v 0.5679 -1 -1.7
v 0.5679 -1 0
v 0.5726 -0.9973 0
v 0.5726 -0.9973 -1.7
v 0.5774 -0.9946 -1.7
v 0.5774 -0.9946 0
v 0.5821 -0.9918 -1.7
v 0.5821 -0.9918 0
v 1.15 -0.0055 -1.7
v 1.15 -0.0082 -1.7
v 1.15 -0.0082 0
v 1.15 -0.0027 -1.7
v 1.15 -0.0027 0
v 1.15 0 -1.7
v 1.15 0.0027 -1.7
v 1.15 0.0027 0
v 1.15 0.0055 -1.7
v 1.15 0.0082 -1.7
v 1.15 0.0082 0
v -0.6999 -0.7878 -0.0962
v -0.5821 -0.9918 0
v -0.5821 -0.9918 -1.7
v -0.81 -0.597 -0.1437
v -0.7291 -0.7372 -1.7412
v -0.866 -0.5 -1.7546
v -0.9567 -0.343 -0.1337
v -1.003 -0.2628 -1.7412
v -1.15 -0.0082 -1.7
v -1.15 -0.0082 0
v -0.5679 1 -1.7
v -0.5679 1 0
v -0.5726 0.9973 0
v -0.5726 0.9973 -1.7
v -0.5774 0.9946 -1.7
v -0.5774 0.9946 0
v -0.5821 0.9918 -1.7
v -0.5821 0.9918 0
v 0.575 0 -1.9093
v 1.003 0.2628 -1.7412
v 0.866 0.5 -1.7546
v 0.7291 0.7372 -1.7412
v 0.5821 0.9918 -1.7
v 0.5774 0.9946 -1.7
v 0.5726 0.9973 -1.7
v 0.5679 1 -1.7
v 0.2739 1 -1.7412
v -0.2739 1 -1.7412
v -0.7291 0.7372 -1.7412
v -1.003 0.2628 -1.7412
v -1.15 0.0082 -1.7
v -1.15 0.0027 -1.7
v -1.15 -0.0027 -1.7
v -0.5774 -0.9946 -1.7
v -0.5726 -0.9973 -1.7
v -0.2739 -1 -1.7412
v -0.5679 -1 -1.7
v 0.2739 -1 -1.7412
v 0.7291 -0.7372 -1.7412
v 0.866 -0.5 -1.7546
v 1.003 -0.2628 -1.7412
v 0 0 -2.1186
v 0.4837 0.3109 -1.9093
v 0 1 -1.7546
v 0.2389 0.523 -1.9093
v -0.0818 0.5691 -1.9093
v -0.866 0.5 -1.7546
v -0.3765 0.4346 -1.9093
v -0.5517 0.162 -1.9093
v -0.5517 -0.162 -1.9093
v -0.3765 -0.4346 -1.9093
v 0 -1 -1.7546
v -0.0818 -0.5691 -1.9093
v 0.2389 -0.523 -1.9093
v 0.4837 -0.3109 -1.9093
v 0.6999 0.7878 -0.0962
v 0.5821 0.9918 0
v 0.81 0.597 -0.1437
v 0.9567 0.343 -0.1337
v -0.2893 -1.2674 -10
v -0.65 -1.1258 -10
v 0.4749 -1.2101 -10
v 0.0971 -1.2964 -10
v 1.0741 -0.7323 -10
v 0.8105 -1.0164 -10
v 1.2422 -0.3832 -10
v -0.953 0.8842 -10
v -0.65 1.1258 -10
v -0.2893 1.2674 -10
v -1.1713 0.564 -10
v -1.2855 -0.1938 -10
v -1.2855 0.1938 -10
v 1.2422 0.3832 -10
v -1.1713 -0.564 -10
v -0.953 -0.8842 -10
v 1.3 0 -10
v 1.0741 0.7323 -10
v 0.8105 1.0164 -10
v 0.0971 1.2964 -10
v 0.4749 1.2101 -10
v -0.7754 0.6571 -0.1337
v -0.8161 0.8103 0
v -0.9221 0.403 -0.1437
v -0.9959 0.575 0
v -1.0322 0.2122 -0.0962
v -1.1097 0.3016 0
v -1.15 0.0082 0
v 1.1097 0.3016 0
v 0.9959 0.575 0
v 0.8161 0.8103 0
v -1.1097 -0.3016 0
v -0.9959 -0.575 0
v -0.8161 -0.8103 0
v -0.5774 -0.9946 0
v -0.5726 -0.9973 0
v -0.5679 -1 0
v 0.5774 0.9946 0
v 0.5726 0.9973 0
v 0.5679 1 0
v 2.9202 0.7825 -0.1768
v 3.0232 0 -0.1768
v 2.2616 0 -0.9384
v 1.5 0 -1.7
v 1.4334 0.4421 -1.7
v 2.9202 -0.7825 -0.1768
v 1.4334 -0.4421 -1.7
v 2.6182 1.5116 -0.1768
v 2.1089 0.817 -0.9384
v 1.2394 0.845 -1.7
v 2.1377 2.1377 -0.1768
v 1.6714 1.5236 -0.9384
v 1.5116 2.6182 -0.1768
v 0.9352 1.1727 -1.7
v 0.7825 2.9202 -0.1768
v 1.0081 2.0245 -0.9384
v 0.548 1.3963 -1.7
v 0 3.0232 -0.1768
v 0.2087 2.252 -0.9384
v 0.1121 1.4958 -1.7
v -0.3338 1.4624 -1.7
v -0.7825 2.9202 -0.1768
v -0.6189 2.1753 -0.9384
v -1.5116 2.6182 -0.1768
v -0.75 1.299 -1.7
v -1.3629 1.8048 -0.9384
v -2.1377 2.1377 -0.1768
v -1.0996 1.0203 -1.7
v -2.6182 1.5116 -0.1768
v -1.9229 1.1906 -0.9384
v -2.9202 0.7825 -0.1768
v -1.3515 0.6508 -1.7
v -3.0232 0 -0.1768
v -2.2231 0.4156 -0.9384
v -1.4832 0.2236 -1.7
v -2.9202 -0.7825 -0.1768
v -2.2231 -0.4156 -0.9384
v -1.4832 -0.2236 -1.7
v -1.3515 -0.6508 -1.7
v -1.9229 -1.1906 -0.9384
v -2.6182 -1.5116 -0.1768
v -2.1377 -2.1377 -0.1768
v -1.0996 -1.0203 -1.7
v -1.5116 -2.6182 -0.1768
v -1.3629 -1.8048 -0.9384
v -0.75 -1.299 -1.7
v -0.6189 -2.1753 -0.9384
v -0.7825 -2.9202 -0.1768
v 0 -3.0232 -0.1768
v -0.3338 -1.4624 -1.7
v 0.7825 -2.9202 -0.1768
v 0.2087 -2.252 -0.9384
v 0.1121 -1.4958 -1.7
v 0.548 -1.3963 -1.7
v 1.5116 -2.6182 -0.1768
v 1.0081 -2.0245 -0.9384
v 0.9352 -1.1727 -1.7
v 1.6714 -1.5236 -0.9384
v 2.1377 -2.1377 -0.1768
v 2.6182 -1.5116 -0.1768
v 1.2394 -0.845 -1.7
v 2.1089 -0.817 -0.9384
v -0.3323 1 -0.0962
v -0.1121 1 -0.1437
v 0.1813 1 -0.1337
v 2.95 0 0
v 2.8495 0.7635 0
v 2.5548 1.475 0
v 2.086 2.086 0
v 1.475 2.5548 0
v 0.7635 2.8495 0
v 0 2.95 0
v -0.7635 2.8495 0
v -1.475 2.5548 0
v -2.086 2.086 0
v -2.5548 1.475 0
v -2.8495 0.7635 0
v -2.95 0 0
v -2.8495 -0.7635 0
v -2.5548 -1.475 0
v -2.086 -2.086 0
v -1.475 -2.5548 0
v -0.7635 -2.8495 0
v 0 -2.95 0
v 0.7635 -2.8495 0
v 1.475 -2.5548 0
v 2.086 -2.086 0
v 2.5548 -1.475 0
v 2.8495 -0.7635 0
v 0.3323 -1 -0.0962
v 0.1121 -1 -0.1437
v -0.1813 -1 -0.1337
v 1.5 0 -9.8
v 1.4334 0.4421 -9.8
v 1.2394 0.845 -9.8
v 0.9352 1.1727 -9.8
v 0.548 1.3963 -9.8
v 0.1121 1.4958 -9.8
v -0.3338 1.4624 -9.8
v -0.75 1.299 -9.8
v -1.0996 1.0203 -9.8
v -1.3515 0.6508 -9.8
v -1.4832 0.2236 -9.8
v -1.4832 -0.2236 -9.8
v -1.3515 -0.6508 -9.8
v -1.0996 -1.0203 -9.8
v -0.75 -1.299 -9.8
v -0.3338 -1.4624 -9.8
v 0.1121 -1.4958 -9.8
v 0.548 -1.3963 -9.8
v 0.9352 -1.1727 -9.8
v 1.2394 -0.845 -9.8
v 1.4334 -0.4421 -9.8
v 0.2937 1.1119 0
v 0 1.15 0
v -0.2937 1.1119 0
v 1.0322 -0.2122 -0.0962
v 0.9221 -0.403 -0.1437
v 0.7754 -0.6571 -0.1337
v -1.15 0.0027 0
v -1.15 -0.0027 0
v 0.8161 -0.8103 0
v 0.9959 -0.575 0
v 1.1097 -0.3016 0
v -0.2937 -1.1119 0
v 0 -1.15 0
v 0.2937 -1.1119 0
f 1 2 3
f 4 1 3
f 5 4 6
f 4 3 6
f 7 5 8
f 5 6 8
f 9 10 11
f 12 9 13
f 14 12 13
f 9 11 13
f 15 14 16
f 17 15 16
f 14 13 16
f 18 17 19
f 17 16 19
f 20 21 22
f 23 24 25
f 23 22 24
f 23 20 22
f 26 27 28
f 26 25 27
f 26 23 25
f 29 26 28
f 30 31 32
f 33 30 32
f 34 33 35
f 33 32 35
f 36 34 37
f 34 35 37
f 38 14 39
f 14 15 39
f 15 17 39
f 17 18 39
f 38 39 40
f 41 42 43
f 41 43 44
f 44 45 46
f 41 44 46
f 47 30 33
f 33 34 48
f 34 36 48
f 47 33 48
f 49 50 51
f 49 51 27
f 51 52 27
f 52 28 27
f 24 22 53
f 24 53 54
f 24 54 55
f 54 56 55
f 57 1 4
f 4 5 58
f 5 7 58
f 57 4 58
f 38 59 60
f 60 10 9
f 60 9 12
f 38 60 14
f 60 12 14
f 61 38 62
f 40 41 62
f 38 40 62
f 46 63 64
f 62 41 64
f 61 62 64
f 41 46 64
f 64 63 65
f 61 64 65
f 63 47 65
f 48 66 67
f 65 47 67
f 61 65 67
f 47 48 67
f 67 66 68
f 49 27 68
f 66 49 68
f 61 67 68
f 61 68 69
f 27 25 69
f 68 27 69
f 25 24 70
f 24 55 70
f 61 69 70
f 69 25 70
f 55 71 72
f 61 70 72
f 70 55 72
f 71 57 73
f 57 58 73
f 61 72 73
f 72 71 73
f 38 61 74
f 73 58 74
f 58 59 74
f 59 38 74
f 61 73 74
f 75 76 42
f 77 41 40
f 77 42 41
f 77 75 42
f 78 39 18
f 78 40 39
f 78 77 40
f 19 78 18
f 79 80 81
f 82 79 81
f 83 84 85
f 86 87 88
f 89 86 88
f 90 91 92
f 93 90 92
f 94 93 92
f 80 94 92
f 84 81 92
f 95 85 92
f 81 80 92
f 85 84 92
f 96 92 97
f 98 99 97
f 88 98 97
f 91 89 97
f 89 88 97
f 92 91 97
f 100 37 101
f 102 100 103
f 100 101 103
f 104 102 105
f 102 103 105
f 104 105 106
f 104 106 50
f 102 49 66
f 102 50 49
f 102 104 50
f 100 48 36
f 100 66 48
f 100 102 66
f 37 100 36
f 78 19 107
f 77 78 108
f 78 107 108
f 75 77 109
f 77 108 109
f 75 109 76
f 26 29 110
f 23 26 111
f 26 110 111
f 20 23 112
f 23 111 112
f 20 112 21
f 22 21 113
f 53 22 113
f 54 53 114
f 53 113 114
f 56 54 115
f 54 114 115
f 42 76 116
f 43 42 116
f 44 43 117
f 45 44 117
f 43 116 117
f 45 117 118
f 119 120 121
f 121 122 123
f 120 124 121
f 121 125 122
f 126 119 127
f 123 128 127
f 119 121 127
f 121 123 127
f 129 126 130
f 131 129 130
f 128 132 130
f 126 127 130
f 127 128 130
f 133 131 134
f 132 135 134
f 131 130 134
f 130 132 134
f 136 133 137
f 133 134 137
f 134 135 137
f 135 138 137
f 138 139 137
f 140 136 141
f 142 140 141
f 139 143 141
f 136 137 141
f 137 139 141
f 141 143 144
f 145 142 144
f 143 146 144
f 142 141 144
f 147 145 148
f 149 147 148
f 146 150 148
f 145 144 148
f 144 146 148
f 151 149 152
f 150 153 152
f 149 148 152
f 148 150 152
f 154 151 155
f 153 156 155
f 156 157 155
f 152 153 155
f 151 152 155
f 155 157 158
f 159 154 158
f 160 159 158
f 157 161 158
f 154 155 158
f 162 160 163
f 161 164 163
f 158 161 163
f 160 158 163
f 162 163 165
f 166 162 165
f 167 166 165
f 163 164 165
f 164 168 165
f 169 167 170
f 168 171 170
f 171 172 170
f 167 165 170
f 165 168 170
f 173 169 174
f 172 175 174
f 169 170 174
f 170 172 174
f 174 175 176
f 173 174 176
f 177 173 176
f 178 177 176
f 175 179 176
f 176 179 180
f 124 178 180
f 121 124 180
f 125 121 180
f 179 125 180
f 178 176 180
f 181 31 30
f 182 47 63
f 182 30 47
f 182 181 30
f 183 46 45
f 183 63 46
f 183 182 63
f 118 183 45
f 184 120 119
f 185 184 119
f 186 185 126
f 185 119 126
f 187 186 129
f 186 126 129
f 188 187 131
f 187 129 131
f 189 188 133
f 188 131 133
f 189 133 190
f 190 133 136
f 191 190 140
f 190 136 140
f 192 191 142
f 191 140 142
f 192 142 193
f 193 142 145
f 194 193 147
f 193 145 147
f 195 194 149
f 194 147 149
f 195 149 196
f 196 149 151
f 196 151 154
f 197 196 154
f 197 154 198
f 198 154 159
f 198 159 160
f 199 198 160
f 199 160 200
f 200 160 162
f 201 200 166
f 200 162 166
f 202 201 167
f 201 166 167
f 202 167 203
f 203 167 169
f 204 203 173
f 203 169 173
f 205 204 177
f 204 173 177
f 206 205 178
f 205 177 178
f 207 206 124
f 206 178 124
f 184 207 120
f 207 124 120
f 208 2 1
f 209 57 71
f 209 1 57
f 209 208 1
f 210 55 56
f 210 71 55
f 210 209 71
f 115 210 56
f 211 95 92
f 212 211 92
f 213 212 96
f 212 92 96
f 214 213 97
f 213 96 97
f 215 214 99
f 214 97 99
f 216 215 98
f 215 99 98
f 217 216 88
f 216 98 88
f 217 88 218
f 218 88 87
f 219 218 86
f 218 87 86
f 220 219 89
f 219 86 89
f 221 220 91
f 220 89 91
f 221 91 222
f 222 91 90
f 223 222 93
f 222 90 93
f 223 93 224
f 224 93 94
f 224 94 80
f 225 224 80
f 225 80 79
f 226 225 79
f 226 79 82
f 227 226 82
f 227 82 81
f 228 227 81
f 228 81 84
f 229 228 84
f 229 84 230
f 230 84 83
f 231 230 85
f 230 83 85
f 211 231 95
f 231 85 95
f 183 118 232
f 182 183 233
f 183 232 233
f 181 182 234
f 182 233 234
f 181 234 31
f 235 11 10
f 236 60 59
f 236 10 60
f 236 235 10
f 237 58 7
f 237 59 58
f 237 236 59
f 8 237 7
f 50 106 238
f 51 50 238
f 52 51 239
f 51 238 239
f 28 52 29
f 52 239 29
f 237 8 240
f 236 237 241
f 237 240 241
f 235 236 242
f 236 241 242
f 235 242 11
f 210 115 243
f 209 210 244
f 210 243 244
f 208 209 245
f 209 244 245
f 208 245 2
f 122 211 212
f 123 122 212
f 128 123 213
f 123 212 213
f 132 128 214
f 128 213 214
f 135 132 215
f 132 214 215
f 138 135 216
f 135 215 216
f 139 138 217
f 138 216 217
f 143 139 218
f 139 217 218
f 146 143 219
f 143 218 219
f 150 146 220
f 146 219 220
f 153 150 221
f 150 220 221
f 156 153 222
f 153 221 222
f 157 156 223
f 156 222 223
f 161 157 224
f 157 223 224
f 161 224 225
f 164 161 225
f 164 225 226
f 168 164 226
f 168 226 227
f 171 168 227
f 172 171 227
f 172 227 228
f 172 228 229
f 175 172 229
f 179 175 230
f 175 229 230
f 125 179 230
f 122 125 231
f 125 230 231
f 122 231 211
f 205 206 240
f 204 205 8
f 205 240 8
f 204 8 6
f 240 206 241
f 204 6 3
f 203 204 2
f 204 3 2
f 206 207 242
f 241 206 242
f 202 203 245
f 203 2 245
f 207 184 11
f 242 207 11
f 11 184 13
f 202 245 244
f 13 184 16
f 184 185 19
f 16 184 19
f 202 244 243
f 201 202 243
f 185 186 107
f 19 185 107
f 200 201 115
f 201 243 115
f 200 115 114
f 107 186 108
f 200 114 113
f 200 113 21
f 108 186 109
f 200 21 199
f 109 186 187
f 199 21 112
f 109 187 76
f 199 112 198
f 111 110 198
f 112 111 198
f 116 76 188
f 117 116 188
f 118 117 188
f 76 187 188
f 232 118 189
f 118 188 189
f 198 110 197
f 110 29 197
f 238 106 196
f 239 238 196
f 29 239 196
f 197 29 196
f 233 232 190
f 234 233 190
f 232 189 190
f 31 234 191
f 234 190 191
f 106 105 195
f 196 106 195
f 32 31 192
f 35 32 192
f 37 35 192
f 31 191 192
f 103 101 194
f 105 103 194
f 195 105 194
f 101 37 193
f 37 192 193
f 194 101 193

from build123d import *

# Parameters (mm, degrees)
SKETCH001_R     = 2.15
POCKET_DEPTH    = 3.119566
CHAMFER_SIZE    = 0.25
CHAMFER001_SIZE = 0.2


with BuildPart() as pocket:
    # Sketch003 → Revolution001 (revolve)
    with BuildSketch(Plane.XZ):
        Polygon((0, -2.118566), (1.15, -1.7), (1.15, 1), (0, 1), align=None)
    revolve(axis=Axis((0, 0, 0), (0, 0, 1)))

    # Sketch001 → Pocket (cut, through all)
    with BuildSketch(Plane(origin=(0, 0, 1), x_dir=(-1, 0, 0), z_dir=(0, 0, 1))):
        Circle(SKETCH001_R)
        Polygon((-0.57735, 1), (0.57735, 1), (1.154701, 0), (0.57735, -1), (-0.57735, -1), (-1.154701, 0), align=None, mode=Mode.SUBTRACT)
    extrude(amount=-POCKET_DEPTH, mode=Mode.SUBTRACT)


with BuildPart() as chamfer001:
    # Sketch → Revolution (revolve)
    with BuildSketch(Plane.XZ):
        Polygon((1.15, 0), (3.199999, 0), (1.5, -1.7), (1.5, -10), (0, -10), (0, -1.150001), align=None)
    revolve(axis=Axis((0, 0, 0), (0, 0, 1)))

    # Cut: cut Pocket
    add(pocket.part, mode=Mode.SUBTRACT)

    # Chamfer
    chamfer_edges = [chamfer001.edges().sort_by_distance(p)[0] for p in [
        (-3.199999, 0, 0),
    ]]
    chamfer(chamfer_edges, length=CHAMFER_SIZE)

    # Chamfer001
    chamfer001_edges = [chamfer001.edges().sort_by_distance(p)[0] for p in [
        (-1.5, 0, -10),
    ]]
    chamfer(chamfer001_edges, length=CHAMFER001_SIZE)


solid = chamfer001.part
